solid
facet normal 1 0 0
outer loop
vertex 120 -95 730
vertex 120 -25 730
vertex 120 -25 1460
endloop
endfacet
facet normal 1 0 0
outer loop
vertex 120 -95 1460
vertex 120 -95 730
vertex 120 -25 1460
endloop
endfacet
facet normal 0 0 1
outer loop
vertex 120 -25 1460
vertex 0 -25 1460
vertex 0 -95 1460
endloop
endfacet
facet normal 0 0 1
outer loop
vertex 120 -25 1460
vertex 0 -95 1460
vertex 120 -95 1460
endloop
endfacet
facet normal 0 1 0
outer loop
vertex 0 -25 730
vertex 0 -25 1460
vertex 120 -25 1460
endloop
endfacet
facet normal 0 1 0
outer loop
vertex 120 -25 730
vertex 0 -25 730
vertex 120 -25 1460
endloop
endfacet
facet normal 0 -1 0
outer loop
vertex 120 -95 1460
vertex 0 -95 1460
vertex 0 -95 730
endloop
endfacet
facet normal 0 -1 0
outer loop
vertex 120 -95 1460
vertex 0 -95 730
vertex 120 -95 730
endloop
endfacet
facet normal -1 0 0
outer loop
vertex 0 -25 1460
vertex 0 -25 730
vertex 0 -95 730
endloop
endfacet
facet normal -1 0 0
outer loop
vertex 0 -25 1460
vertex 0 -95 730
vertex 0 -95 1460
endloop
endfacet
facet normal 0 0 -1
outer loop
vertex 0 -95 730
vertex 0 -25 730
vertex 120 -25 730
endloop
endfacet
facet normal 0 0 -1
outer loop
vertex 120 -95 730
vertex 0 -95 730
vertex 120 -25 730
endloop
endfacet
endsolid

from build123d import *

# Parameters (mm, degrees)
F0_W     = 120
F0_H     = 730
F1_DEPTH = 70


with BuildPart() as f1:
    # F0 (on Front) → F1 (new body)
    with BuildSketch(Plane.XZ):
        with Locations((60, 365)):
            Rectangle(F0_W, F0_H)
    extrude(amount=F1_DEPTH)


with BuildPart() as f1_1:
    # F3: moved
    add(f1.part.moved(Location((0, 0, 730))))


with BuildPart() as f1_2:
    # F4: moved
    add(f1_1.part.moved(Location((0, -25, 0))))


solid = f1_2.part
